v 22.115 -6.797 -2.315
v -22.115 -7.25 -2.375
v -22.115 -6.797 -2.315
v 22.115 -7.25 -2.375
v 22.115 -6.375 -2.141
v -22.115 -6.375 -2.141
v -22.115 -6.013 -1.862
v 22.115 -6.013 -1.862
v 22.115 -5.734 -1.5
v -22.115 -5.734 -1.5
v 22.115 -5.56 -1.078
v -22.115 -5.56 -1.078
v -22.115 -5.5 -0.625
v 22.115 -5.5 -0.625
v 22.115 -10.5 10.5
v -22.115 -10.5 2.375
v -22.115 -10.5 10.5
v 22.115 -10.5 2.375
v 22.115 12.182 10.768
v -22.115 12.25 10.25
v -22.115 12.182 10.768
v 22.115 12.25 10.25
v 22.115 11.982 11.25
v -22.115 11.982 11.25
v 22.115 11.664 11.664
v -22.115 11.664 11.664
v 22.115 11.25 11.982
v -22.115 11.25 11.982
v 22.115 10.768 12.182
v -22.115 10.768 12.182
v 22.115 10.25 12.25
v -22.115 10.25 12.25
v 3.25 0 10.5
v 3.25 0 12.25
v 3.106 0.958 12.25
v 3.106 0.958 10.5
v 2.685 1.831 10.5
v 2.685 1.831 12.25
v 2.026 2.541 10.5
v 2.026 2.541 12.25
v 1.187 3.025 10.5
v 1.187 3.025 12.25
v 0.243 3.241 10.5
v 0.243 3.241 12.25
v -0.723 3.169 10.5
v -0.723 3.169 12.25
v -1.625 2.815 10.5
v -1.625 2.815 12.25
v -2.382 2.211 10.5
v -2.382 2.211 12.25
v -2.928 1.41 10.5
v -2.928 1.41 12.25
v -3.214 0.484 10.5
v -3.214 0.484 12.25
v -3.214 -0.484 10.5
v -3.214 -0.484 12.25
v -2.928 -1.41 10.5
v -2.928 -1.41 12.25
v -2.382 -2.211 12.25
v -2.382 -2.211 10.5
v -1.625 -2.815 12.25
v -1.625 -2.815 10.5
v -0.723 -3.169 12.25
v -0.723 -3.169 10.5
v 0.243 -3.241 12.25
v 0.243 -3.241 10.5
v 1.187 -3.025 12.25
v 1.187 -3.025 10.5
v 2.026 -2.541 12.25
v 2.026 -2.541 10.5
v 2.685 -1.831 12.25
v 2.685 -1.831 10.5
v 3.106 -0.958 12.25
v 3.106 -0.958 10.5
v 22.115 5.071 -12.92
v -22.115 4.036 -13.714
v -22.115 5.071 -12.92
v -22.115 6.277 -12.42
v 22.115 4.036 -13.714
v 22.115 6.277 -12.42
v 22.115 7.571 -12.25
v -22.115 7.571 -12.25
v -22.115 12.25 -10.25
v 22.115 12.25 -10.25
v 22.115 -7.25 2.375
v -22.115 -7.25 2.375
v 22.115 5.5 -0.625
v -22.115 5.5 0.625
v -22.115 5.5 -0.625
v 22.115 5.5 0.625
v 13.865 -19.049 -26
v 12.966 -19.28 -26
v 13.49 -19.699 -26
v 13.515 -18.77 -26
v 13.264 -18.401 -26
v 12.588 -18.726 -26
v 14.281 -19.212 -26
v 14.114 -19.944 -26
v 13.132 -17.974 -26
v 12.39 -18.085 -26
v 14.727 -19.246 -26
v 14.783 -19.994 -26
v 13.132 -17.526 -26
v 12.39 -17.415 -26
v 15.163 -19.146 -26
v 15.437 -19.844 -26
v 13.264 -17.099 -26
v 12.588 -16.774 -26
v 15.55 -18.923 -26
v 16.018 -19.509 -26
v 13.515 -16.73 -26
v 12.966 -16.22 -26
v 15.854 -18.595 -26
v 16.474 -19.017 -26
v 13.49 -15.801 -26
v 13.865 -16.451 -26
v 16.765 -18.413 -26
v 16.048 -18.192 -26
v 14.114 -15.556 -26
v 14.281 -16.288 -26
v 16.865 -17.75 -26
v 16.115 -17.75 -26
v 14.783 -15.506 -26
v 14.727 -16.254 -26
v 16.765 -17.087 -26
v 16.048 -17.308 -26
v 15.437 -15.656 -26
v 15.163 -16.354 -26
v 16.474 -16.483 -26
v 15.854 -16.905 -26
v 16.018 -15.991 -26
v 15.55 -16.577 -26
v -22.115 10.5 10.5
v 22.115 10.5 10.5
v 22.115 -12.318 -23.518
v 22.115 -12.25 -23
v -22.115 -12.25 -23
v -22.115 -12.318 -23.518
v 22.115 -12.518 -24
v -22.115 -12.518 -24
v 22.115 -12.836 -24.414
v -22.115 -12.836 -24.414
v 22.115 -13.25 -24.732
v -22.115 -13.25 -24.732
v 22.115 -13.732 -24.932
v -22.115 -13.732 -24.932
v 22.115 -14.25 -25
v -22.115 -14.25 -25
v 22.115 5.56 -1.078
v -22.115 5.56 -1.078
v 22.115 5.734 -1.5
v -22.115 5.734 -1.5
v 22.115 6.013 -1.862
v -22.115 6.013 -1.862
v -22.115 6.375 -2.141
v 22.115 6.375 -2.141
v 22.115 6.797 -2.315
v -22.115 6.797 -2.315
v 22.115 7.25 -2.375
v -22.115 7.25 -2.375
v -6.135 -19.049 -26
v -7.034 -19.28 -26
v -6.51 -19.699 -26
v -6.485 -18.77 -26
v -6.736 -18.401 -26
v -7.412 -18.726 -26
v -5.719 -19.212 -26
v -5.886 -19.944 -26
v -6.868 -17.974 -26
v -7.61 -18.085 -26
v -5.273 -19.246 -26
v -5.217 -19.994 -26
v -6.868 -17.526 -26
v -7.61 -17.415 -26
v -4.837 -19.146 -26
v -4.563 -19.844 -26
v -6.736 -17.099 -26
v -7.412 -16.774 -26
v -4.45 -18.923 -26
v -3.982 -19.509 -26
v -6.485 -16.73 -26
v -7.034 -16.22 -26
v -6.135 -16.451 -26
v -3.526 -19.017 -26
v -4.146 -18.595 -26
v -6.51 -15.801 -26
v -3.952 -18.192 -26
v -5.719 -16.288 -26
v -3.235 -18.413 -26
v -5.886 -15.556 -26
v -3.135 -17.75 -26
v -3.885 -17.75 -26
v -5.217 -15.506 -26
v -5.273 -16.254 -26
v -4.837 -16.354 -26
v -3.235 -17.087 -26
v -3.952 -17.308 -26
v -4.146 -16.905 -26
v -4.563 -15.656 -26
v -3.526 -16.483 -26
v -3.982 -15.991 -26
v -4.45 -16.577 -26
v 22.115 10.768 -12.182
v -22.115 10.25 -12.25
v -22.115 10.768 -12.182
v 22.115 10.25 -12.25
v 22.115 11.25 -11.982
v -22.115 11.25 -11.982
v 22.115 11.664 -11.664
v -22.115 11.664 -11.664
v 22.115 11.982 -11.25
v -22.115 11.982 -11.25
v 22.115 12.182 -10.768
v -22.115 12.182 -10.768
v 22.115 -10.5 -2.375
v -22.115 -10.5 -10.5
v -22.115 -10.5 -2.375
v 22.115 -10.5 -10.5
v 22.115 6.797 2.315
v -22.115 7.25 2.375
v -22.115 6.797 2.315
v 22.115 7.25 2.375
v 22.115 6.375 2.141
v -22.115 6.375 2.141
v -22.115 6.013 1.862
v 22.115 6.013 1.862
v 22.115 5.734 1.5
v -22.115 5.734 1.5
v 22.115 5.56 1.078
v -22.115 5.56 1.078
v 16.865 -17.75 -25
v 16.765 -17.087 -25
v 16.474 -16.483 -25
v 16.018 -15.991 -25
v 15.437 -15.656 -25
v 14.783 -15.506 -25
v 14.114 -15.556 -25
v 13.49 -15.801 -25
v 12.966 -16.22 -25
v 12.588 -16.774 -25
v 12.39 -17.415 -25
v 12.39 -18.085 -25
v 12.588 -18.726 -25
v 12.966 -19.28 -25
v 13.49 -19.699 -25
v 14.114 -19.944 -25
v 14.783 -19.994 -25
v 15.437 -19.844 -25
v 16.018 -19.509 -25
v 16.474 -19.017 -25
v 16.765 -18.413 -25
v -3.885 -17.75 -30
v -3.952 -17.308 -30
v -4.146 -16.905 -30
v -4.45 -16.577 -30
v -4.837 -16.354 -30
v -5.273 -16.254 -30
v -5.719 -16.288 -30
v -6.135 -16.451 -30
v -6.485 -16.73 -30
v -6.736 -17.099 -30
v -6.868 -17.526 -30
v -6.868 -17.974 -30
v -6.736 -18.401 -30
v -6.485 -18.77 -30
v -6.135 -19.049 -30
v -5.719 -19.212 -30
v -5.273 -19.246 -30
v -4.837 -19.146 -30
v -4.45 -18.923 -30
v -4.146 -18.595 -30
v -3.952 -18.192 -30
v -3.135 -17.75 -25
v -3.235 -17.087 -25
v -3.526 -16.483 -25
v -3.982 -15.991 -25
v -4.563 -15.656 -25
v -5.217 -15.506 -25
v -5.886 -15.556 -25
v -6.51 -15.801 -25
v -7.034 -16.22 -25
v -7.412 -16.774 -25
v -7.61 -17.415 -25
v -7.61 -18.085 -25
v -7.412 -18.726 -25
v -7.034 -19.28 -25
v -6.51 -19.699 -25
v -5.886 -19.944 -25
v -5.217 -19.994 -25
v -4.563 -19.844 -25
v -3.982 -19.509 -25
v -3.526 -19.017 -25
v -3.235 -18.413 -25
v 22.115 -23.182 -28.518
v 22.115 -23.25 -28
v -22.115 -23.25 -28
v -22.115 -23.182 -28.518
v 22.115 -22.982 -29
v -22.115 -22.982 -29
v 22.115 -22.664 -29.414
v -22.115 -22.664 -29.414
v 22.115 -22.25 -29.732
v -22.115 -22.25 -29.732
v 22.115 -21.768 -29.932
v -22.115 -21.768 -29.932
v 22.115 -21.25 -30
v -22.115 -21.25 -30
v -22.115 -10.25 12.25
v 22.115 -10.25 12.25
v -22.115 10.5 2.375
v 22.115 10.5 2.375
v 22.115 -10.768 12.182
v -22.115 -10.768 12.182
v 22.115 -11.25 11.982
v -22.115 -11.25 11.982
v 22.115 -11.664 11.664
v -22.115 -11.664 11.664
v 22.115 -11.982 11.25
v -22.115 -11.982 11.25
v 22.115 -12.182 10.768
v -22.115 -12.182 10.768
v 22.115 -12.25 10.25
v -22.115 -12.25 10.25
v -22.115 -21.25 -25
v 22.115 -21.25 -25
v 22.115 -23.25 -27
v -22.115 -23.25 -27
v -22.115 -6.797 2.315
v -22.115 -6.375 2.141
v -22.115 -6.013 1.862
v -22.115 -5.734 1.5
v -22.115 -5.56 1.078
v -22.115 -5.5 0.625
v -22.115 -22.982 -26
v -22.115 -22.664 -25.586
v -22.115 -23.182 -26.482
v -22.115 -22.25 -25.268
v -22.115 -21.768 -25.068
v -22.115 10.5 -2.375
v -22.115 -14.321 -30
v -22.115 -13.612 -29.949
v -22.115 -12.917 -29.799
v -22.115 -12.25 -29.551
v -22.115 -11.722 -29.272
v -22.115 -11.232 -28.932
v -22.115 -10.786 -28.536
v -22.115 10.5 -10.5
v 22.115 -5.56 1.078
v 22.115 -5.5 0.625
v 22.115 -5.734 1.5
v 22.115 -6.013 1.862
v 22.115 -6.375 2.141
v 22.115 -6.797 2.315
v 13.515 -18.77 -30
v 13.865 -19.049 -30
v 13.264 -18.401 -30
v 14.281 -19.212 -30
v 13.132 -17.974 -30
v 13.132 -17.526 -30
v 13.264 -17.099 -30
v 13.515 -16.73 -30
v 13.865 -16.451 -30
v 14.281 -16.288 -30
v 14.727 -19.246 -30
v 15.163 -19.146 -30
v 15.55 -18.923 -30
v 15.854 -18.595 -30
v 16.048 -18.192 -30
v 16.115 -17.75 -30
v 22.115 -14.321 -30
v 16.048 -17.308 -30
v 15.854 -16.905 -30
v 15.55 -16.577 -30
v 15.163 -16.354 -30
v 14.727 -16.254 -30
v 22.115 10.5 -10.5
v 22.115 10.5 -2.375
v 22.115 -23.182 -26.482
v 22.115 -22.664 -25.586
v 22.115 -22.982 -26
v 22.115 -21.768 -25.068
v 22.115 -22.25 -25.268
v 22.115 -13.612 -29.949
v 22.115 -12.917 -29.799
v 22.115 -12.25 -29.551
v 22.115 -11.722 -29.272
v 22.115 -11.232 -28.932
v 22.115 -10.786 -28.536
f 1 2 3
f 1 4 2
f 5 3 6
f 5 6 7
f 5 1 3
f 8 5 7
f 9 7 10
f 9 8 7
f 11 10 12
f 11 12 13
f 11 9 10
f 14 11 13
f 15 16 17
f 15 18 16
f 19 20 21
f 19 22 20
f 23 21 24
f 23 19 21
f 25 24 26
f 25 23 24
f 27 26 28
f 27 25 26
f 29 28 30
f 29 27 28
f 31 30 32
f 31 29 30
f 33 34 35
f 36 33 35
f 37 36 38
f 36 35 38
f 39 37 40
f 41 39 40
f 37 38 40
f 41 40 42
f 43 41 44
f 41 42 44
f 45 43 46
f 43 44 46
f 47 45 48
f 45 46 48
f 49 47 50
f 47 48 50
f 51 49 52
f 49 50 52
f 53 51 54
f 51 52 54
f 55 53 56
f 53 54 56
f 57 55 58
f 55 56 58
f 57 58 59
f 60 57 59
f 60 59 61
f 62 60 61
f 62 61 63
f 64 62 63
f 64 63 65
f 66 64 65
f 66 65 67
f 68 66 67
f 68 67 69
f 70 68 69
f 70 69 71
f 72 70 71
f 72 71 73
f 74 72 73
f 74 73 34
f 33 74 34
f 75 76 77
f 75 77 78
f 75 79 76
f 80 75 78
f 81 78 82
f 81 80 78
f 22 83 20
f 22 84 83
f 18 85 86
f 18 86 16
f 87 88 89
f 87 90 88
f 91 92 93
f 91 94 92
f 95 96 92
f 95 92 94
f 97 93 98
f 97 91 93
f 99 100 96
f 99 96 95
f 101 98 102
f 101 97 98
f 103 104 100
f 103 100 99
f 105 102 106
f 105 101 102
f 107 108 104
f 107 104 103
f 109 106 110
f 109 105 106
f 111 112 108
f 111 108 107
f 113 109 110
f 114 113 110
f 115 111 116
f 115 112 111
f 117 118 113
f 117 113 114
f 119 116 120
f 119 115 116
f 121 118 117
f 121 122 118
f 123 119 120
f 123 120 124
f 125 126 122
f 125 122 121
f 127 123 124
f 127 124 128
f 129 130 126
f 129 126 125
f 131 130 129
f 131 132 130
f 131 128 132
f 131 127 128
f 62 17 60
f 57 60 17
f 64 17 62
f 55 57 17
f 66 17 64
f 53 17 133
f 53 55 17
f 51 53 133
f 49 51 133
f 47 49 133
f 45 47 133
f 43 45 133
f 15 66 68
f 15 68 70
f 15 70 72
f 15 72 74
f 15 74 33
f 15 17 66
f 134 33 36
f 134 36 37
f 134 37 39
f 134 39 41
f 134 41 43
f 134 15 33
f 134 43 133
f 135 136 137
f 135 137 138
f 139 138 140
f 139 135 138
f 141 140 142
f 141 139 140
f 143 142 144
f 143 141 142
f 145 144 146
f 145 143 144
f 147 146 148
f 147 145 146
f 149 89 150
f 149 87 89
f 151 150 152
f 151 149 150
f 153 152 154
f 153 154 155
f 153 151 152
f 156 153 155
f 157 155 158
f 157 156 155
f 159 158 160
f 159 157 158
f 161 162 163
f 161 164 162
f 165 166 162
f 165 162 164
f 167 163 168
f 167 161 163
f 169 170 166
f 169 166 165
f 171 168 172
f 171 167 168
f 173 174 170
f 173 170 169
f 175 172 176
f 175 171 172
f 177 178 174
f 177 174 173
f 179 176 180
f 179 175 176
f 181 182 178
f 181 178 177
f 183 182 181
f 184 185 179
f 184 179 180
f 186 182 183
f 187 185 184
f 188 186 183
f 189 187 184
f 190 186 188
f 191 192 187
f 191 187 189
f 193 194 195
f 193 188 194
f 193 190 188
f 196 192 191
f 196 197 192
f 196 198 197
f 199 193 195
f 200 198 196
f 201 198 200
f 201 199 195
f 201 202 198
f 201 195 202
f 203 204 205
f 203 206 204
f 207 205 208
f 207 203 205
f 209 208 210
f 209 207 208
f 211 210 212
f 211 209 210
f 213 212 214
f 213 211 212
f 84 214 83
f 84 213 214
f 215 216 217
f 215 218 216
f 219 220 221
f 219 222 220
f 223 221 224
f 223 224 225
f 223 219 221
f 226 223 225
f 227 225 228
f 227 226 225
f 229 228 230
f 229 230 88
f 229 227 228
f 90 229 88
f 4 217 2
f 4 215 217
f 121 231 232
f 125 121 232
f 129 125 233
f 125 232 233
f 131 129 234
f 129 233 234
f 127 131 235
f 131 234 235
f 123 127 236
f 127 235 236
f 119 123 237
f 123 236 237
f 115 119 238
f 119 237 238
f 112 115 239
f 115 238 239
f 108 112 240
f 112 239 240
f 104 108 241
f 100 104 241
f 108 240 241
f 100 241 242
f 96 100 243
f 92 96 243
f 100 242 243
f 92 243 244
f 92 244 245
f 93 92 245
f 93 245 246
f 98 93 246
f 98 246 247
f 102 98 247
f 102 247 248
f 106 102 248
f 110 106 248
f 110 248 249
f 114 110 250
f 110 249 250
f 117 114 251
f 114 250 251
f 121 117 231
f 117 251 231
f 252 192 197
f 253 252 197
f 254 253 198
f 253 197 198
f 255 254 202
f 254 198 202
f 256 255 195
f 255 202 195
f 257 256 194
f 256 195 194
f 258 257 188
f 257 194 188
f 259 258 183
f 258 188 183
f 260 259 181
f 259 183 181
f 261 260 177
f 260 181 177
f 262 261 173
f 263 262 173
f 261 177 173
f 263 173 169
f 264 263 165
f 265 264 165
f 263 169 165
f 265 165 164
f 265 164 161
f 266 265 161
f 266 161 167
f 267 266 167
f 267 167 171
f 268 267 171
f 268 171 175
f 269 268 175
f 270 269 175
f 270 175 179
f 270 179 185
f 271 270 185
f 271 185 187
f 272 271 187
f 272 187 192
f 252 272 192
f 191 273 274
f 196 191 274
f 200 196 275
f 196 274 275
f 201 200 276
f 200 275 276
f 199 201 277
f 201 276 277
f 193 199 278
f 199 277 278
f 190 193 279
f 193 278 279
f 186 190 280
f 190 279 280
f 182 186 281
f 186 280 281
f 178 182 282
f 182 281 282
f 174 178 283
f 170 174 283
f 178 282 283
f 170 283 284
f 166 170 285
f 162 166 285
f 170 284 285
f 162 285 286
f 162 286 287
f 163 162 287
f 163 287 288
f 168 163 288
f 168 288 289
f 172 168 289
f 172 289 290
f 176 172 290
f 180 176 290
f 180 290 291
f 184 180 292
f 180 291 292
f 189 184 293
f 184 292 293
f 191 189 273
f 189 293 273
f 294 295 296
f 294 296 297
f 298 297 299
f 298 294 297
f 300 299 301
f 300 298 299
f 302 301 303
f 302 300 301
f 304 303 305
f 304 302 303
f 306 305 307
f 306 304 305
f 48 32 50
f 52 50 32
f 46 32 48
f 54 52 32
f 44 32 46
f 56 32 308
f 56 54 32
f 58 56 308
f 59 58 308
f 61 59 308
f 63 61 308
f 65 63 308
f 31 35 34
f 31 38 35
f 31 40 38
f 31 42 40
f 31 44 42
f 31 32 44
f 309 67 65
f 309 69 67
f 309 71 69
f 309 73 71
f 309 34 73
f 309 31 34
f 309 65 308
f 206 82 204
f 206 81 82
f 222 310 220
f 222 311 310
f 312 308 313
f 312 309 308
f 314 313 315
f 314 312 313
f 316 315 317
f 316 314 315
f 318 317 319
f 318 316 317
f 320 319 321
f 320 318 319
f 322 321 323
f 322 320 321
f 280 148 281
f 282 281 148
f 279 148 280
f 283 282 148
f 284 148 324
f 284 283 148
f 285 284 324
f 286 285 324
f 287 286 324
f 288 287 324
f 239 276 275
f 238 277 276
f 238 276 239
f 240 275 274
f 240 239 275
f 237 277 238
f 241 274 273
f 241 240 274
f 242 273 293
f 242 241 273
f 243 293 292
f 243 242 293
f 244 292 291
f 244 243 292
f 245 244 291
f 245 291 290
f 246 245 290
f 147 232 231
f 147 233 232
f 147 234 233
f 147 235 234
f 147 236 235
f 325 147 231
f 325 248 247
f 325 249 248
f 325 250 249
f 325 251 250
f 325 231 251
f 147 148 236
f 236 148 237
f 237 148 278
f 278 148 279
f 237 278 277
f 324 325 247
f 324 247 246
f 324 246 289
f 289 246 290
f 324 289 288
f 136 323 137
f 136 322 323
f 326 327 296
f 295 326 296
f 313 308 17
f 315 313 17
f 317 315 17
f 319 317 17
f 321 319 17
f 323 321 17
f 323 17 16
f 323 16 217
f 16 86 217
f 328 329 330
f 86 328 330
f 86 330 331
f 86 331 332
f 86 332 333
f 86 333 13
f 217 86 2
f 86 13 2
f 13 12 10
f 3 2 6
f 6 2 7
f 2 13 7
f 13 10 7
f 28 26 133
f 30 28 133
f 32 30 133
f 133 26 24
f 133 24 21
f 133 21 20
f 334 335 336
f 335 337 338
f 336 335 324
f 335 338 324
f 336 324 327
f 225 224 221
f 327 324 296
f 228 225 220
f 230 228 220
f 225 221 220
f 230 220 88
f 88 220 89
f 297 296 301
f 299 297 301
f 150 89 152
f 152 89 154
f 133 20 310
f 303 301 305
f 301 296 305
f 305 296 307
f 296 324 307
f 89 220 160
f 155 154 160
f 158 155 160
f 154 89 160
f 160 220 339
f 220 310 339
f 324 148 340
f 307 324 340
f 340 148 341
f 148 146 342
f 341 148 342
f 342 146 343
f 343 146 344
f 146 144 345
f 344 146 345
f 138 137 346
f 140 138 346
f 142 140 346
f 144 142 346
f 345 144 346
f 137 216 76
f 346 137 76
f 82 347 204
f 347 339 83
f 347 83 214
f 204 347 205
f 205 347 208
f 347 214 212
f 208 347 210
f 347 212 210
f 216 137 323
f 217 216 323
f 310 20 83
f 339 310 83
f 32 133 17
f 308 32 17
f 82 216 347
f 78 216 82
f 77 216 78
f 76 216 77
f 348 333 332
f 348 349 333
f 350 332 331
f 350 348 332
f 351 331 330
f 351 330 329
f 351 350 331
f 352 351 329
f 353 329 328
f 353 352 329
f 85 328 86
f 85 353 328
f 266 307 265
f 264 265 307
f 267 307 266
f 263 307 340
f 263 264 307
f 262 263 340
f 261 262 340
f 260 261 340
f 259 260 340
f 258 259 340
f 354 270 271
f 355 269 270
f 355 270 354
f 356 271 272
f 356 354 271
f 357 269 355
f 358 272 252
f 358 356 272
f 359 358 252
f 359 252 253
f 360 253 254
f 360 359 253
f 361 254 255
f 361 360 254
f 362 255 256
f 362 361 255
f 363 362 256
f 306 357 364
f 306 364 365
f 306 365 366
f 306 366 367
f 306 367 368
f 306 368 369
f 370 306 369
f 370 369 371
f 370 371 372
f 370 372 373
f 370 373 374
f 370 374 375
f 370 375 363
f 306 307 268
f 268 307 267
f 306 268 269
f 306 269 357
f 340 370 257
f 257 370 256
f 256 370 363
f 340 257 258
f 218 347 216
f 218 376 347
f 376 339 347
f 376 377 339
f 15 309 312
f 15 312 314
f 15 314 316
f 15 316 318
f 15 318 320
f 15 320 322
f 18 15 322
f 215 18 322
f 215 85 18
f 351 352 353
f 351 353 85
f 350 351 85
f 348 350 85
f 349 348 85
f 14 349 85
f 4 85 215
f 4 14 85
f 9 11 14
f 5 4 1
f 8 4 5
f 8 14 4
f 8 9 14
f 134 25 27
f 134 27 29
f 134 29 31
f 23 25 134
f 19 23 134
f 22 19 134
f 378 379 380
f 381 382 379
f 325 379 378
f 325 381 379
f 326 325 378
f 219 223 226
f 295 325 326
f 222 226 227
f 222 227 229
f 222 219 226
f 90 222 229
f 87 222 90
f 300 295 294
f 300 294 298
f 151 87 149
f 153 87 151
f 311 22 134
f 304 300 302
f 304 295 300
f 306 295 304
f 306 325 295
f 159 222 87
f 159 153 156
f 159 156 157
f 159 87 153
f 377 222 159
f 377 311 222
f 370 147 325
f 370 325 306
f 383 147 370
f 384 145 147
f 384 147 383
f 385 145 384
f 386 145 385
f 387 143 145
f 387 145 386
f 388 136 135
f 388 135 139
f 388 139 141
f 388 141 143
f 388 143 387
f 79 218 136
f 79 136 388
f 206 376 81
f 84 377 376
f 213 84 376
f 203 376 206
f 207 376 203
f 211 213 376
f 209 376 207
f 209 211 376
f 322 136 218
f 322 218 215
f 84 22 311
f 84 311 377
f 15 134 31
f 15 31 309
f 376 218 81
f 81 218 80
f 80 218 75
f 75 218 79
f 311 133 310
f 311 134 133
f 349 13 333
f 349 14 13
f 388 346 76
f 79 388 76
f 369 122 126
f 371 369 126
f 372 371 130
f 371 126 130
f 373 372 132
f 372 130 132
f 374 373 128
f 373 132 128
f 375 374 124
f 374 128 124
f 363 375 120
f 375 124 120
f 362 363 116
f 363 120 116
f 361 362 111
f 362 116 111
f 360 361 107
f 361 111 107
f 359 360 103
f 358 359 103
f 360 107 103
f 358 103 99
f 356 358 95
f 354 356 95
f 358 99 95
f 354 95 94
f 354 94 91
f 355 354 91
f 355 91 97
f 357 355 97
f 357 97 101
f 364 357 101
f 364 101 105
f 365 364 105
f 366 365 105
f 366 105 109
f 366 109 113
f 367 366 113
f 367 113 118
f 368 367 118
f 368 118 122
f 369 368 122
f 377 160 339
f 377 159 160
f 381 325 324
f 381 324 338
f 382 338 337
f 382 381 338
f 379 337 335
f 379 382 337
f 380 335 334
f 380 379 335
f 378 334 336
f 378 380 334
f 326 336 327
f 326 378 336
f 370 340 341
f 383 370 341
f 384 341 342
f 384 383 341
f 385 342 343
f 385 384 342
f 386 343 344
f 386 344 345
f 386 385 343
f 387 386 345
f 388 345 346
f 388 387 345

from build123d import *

# Parameters (mm, degrees)
BOSS_EXTRUDE1_DEPTH      = 22.115
BOSS_EXTRUDE1_DEPTH_BACK = 22.115
SKETCH2_R                = 3.25
CUT_EXTRUDE1_DEPTH       = 11.115
SKETCH3_R                = 2.25
CUT_EXTRUDE2_DEPTH       = 1
SKETCH4_R                = 1.5
CUT_EXTRUDE3_DEPTH       = 6


with BuildPart() as part:
    # Sketch1 → Boss-Extrude1 (new, two sides: drawn at the far end of the back side and taken through both)
    with BuildSketch(Plane(origin=(0, 0, 0), x_dir=(0, 0, -1), z_dir=(1, 0, 0)).offset(-BOSS_EXTRUDE1_DEPTH_BACK)):
        with BuildLine():
            Line((-10.25, -12.25), (23, -12.25))
            ThreePointArc((23, -12.25), (24.414213562, -12.835786438), (25, -14.25))
            Line((25, -14.25), (25, -21.25))
            ThreePointArc((25, -21.25), (25.585786438, -22.664213562), (27, -23.25))
            Line((27, -23.25), (28, -23.25))
            ThreePointArc((28, -23.25), (29.414213562, -22.664213562), (30, -21.25))
            Line((30, -21.25), (30, -14.321067812))
            ThreePointArc((30, -14.321067812), (29.886434949, -13.261467186), (29.550898606, -12.25))
            ThreePointArc((29.550898606, -12.25), (29.108985632, -11.472166783), (28.535533906, -10.785533906))
            Line((28.535533906, -10.785533906), (13.714466094, 4.035533906))
            ThreePointArc((13.714466094, 4.035533906), (12.630602337, 5.65765065), (12.25, 7.571067812))
            Line((12.25, 7.571067812), (12.25, 10.25))
            ThreePointArc((12.25, 10.25), (11.664213562, 11.664213562), (10.25, 12.25))
            Line((10.25, 12.25), (-10.25, 12.25))
            ThreePointArc((-10.25, 12.25), (-11.664213562, 11.664213562), (-12.25, 10.25))
            Line((-12.25, 10.25), (-12.25, -10.25))
            ThreePointArc((-12.25, -10.25), (-11.664213562, -11.664213562), (-10.25, -12.25))
        make_face()
        with BuildLine():
            Line((-2.375, -7.25), (-2.375, -10.5))
            Line((-2.375, -10.5), (-10.5, -10.5))
            Line((-10.5, -10.5), (-10.5, 10.5))
            Line((-10.5, 10.5), (-2.375, 10.5))
            Line((-2.375, 10.5), (-2.375, 7.25))
            ThreePointArc((-2.375, 7.25), (-1.862436867, 6.012563133), (-0.625, 5.5))
            Line((-0.625, 5.5), (0.625, 5.5))
            ThreePointArc((0.625, 5.5), (1.862436867, 6.012563133), (2.375, 7.25))
            Line((2.375, 7.25), (2.375, 10.5))
            Line((2.375, 10.5), (10.5, 10.5))
            Line((10.5, 10.5), (10.5, -10.5))
            Line((10.5, -10.5), (2.375, -10.5))
            Line((2.375, -10.5), (2.375, -7.25))
            ThreePointArc((2.375, -7.25), (1.862436867, -6.012563133), (0.625, -5.5))
            Line((0.625, -5.5), (-0.625, -5.5))
            ThreePointArc((-0.625, -5.5), (-1.862436867, -6.012563133), (-2.375, -7.25))
        make_face(mode=Mode.SUBTRACT)
    extrude(amount=BOSS_EXTRUDE1_DEPTH + BOSS_EXTRUDE1_DEPTH_BACK)

    # Sketch2 → Cut-Extrude1 (cut)
    with BuildSketch(Plane.XY.offset(12.25)):
        Circle(SKETCH2_R)
    extrude(amount=-CUT_EXTRUDE1_DEPTH, mode=Mode.SUBTRACT)

    # Sketch3 → Cut-Extrude2 (cut)
    with BuildSketch(Plane.XY.offset(-25)):
        with Locations((14.615, -17.75)):
            Circle(SKETCH3_R)
        with Locations((-5.385, -17.75)):
            Circle(SKETCH3_R)
    extrude(amount=-CUT_EXTRUDE2_DEPTH, mode=Mode.SUBTRACT)

    # Sketch4 → Cut-Extrude3 (cut)
    with BuildSketch(Plane.XY.offset(-26)):
        with Locations((-5.385, -17.75)):
            Circle(SKETCH4_R)
        with Locations((14.615, -17.75)):
            Circle(SKETCH4_R)
    extrude(amount=-CUT_EXTRUDE3_DEPTH, mode=Mode.SUBTRACT)


solid = part.part
